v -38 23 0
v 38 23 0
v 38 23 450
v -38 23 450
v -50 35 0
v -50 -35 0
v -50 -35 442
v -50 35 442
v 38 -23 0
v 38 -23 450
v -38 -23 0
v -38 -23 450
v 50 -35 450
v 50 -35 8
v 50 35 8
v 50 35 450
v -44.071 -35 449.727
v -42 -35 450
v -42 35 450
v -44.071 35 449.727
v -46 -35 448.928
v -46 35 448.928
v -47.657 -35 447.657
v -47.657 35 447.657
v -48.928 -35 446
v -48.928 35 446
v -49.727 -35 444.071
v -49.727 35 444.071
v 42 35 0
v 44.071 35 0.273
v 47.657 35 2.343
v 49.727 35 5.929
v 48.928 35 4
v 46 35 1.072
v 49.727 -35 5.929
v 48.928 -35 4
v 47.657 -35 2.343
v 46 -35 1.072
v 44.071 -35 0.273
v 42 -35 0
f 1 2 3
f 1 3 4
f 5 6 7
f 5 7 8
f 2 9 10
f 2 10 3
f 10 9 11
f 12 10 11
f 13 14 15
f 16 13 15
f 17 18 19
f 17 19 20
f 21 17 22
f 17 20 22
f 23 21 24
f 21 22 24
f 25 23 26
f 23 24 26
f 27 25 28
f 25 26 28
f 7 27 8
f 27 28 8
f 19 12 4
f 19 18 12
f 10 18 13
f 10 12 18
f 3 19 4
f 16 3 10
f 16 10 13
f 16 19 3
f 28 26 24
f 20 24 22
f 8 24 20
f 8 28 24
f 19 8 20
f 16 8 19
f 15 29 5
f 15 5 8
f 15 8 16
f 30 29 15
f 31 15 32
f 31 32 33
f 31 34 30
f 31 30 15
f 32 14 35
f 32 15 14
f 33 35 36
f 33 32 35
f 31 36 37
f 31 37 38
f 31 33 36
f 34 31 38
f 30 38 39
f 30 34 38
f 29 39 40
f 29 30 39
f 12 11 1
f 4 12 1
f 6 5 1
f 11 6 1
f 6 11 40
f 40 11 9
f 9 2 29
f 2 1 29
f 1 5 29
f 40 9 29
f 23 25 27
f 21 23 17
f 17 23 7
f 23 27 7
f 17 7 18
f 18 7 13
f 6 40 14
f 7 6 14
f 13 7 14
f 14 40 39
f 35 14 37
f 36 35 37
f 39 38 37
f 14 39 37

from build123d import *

# Parameters (mm, degrees)
SKETCH_2_W          = 100
SKETCH_2_H          = 70
EXTRUDE_1_DEPTH     = 450
SKETCH_3_W          = 76
SKETCH_3_H          = 46
CUT_EXTRUDE_1_DEPTH = 420
SKETCH_4_W          = 76
SKETCH_4_H          = 46
CUT_EXTRUDE_2_DEPTH = 30
FILLET_1_R          = 8
FILLET_3_R          = 8


with BuildPart() as part:
    # 草图2 → 凸台-拉伸1 (new body)
    with BuildSketch(Plane.XY):
        Rectangle(SKETCH_2_W, SKETCH_2_H)
    extrude(amount=EXTRUDE_1_DEPTH)

    # 草图3 → 切除-拉伸1 (cut)
    with BuildSketch(Plane(origin=(0, 0, 0), x_dir=(-1, 0, 0), z_dir=(0, 0, -1))):
        Rectangle(SKETCH_3_W, SKETCH_3_H)
    extrude(amount=-CUT_EXTRUDE_1_DEPTH, mode=Mode.SUBTRACT)

    # 草图4 → 切除-拉伸2 (cut)
    with BuildSketch(Plane.XY.offset(450)):
        Rectangle(SKETCH_4_W, SKETCH_4_H)
    extrude(amount=-CUT_EXTRUDE_2_DEPTH, mode=Mode.SUBTRACT)

    # 圆角1
    fillet_1_edges = [part.edges().sort_by_distance(p)[0] for p in [
        (50, 0, 0),
    ]]
    fillet(fillet_1_edges, radius=FILLET_1_R)

    # 圆角3
    fillet_3_edges = [part.edges().sort_by_distance(p)[0] for p in [
        (-50, 0, 450),
    ]]
    fillet(fillet_3_edges, radius=FILLET_3_R)


solid = part.part
